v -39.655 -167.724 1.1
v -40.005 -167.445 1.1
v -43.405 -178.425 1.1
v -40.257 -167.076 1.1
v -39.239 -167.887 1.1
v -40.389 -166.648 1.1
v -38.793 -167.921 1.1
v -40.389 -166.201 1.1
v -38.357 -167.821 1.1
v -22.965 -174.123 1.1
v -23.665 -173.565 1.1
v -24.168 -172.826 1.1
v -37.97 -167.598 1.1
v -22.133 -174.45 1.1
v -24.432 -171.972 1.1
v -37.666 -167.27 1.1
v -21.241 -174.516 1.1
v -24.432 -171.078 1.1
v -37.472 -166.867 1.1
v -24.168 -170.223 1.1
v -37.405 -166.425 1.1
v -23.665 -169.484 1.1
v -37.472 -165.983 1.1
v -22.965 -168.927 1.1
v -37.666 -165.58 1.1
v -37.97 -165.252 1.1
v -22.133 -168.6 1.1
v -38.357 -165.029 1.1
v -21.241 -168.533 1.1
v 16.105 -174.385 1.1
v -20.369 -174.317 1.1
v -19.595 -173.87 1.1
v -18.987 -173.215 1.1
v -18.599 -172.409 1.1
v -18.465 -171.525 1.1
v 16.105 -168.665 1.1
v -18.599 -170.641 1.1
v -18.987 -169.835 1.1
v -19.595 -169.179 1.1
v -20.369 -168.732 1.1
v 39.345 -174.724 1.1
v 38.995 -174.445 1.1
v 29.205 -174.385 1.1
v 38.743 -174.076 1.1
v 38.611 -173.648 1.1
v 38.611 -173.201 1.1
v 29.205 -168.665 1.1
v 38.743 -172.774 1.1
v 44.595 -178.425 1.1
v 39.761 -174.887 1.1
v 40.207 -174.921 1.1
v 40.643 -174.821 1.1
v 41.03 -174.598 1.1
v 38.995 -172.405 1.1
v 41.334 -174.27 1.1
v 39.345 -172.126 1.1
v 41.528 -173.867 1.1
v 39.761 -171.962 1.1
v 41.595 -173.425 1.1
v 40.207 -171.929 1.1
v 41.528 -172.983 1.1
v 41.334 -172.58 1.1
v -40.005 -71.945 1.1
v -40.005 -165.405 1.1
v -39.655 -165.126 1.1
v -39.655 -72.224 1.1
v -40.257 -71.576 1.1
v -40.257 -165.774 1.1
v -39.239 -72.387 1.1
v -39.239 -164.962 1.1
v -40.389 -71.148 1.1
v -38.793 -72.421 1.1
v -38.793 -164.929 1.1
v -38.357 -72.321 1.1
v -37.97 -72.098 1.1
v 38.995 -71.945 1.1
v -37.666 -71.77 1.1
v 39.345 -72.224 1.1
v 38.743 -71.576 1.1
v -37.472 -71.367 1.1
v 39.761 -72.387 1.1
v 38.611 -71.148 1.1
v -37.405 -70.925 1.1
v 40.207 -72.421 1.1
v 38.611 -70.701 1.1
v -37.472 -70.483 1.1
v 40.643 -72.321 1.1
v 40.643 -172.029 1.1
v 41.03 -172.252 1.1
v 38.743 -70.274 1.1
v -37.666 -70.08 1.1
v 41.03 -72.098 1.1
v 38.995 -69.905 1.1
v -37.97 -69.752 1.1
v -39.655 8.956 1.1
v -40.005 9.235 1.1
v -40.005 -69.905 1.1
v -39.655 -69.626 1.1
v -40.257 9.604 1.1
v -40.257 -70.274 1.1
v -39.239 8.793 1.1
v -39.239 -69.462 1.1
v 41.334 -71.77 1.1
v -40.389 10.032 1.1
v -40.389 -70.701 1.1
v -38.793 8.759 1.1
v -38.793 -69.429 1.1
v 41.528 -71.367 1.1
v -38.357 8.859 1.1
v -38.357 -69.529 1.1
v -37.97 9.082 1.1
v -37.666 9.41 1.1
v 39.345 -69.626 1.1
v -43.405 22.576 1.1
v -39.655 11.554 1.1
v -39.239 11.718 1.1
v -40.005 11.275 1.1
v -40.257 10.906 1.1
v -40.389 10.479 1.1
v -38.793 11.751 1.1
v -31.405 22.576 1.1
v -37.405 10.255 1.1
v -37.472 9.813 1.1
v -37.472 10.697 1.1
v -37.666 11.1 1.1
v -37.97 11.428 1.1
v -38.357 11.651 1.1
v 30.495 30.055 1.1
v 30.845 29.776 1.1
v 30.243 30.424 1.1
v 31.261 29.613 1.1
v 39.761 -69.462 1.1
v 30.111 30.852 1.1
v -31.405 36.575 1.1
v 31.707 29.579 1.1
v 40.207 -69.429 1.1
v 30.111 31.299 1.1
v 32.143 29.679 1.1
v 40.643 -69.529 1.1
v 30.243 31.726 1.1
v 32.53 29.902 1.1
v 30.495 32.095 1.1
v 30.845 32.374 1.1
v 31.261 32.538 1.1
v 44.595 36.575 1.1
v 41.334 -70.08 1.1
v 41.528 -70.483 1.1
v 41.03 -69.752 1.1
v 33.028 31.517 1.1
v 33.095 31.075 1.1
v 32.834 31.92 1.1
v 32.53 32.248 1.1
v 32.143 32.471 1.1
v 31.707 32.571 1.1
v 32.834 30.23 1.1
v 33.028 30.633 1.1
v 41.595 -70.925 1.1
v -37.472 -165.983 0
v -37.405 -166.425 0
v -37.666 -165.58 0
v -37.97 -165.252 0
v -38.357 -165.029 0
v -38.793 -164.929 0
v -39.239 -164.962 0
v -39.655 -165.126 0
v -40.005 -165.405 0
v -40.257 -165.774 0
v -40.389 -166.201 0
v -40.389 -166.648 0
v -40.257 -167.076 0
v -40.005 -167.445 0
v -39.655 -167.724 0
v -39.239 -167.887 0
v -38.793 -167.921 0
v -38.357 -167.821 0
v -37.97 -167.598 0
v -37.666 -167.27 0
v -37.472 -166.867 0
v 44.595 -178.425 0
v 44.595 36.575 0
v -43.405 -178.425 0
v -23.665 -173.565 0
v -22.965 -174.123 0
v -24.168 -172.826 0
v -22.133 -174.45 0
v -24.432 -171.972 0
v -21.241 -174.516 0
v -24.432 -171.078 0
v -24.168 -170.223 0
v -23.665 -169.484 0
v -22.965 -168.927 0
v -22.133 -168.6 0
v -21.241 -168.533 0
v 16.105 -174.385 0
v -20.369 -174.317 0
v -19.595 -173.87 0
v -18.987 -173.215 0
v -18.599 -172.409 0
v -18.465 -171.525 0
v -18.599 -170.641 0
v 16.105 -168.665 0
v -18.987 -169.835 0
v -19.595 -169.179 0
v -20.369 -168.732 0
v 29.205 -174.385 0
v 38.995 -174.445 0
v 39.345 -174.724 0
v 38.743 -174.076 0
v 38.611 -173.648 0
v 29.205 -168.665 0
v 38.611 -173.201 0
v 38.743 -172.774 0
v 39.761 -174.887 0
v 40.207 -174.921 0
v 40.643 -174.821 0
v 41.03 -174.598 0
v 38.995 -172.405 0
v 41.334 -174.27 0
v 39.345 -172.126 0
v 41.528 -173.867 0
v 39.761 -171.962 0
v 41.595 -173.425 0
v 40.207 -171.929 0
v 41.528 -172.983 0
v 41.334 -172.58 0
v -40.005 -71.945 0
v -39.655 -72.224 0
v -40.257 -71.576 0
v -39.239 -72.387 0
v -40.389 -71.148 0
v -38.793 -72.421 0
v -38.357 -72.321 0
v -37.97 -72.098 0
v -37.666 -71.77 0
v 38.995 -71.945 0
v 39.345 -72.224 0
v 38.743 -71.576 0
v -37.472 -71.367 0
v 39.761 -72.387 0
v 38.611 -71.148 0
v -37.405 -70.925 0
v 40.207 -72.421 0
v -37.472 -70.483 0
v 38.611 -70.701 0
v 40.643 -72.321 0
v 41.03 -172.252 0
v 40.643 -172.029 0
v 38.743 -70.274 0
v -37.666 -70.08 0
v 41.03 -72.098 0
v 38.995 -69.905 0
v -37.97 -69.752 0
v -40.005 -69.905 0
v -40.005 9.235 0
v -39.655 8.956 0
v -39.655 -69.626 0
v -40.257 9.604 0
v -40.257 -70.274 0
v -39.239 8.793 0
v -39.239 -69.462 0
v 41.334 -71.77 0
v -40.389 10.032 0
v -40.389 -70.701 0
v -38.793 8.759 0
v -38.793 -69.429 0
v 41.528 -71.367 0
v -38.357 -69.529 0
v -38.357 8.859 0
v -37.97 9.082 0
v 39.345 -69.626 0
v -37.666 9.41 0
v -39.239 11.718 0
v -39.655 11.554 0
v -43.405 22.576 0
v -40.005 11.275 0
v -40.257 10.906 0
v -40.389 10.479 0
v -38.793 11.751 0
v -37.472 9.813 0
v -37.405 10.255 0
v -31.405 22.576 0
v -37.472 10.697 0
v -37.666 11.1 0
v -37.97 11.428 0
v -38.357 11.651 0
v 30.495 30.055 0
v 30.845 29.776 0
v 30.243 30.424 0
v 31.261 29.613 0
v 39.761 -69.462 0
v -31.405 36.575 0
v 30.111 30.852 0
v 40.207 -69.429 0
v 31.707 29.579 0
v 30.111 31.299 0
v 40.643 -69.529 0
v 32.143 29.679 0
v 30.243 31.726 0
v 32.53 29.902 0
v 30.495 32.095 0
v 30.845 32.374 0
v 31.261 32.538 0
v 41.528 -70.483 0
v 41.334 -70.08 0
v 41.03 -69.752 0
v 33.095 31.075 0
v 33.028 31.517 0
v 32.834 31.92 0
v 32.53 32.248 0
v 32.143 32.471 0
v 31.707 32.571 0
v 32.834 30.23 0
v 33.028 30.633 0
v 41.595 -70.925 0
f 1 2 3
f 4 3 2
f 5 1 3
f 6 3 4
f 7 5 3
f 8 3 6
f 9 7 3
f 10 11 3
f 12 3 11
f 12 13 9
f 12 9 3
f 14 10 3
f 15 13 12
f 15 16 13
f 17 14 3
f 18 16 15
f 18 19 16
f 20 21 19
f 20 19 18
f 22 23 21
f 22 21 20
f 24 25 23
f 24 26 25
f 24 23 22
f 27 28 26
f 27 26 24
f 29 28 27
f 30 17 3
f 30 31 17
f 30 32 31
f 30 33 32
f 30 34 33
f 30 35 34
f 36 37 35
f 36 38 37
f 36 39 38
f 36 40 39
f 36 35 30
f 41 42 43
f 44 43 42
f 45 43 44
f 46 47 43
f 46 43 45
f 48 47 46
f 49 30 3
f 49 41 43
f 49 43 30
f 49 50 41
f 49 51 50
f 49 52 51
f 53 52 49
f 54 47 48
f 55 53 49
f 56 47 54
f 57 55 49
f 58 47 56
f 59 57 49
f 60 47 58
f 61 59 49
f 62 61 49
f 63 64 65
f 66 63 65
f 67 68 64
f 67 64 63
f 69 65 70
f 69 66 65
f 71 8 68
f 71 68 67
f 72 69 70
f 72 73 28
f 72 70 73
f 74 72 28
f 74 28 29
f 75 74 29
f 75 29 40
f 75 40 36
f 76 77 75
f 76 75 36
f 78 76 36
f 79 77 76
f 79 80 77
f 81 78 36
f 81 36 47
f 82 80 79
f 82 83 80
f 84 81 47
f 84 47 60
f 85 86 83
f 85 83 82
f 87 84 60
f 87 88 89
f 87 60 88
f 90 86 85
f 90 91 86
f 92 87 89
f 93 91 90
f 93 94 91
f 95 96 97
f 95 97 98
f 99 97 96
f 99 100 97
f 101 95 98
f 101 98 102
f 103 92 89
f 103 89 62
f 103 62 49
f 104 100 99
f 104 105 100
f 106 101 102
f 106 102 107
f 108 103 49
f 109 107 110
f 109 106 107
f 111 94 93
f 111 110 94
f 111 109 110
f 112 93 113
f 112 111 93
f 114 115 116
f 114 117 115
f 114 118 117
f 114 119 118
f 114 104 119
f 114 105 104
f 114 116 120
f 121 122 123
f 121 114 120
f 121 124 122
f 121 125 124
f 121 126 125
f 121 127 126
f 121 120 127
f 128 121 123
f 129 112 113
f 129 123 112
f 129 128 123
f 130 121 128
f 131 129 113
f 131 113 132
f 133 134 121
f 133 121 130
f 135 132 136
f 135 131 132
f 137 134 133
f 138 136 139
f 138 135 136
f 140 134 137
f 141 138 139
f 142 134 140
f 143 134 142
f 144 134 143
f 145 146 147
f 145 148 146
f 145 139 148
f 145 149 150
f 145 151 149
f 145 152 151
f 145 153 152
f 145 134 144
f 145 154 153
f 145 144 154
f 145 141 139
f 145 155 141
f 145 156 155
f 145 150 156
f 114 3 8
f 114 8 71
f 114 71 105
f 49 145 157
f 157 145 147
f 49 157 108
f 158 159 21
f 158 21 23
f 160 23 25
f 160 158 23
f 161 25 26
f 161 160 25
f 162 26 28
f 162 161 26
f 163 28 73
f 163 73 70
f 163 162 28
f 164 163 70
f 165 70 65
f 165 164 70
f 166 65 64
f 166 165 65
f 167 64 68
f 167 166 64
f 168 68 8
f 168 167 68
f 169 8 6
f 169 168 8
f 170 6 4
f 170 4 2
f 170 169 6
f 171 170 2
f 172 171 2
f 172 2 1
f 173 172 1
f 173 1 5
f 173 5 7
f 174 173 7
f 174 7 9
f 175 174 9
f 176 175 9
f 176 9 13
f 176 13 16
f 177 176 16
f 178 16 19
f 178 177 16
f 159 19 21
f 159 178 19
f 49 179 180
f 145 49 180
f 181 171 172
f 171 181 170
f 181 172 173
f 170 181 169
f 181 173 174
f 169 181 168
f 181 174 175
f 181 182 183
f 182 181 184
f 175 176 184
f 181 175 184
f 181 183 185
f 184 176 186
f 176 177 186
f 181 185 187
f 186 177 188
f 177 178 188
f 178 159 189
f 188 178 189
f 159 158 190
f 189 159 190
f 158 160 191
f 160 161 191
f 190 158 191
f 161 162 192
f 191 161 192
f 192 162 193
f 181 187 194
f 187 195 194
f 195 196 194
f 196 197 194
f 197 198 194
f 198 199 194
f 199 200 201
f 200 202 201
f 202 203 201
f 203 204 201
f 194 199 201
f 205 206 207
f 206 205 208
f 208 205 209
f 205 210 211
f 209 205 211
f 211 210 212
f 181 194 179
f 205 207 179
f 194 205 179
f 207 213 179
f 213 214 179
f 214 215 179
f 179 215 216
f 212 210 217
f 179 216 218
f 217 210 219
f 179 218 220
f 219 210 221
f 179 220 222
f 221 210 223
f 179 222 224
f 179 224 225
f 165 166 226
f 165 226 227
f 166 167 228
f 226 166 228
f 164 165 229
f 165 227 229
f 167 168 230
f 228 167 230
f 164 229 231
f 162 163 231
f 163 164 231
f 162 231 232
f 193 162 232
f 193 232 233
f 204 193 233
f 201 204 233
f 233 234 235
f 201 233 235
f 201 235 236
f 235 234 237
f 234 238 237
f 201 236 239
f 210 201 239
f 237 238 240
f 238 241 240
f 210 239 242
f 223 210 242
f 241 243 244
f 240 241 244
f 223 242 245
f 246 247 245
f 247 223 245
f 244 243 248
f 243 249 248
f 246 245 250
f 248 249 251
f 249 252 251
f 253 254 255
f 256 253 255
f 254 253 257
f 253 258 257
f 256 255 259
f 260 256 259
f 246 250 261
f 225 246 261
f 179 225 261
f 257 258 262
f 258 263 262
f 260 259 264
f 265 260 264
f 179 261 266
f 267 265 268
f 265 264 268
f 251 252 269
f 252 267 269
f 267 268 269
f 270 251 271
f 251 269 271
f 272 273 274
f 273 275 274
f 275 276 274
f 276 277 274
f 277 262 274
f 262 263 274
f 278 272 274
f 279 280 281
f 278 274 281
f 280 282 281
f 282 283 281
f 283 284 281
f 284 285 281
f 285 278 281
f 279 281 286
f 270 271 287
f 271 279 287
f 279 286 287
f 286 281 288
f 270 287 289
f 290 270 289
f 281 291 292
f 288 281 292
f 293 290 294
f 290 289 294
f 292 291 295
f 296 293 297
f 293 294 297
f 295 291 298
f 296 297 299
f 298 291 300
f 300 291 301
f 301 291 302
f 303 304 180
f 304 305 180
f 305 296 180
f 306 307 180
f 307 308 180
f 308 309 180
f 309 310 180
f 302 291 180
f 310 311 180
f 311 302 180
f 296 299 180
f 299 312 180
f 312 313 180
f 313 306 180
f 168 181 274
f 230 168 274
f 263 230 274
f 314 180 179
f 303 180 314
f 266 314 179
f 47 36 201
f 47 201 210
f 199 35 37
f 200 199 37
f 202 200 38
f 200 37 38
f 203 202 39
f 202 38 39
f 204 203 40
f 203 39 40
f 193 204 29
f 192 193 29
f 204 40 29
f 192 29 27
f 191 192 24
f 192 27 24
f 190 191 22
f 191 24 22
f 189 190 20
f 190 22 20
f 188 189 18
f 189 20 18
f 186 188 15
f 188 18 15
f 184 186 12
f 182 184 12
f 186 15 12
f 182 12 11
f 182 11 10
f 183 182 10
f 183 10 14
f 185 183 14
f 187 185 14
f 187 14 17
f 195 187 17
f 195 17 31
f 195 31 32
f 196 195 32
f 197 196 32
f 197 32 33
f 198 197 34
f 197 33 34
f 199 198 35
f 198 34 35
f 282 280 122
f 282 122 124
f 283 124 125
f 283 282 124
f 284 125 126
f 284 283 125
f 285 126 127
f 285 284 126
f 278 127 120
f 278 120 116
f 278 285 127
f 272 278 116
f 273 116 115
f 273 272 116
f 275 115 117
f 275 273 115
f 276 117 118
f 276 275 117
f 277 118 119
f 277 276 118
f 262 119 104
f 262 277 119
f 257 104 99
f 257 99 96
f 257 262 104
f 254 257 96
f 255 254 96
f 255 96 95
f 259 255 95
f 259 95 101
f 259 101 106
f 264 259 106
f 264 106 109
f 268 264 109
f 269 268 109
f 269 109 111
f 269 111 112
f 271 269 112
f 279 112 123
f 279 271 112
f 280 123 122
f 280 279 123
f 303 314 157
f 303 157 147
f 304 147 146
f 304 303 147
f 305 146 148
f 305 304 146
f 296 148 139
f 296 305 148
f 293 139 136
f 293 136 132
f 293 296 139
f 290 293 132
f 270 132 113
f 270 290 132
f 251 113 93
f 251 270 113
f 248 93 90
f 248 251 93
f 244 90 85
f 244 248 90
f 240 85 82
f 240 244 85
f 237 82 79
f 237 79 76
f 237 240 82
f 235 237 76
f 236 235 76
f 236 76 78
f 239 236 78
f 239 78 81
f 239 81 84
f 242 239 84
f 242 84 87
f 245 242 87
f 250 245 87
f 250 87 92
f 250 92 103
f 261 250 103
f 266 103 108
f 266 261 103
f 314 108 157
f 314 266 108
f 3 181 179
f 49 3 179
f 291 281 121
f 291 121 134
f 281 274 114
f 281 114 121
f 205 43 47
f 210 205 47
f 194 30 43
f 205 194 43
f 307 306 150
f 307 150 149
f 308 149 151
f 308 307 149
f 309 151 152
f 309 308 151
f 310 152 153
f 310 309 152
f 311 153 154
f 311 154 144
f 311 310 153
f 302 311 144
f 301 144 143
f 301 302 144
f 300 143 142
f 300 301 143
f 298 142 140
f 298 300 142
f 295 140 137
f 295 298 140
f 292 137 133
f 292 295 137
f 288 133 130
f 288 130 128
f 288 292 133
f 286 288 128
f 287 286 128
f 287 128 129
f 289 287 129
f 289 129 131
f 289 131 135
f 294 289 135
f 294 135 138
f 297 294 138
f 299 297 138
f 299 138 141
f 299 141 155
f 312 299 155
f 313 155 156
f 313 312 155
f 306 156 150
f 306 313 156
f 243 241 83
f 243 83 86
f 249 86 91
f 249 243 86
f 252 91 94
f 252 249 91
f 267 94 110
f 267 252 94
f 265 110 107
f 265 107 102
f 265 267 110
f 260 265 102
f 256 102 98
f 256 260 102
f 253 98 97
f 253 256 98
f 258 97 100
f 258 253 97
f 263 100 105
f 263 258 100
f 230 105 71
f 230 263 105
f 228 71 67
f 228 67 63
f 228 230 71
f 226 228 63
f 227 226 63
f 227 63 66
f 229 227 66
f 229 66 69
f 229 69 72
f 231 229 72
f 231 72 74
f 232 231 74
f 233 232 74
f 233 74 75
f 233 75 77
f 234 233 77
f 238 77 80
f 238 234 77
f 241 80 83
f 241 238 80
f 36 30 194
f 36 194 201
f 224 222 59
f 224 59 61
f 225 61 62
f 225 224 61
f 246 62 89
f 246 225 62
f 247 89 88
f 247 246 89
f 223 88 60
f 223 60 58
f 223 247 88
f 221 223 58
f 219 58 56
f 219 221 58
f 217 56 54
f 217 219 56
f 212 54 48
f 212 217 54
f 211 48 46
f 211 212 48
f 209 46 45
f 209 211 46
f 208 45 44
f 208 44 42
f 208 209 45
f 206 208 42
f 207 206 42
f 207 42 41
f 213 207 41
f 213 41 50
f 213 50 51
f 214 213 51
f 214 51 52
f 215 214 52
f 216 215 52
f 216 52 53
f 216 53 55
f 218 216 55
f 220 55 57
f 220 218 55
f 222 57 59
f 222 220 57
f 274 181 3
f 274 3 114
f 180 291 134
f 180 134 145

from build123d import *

# Parameters (mm, degrees)
SKETCH3_W              = 88
SKETCH3_H              = 215
BOSS_EXTRUDE3_DEPTH    = 1.1
CUT_EXTRUDE1_OUTLINE_W = 12
CUT_EXTRUDE1_OUTLINE_H = 13.99905087
CUT_EXTRUDE1_OUTLINE_R = 1.5
CUT_EXTRUDE1_DEPTH     = 1.1
SKETCH4_R              = 3
CUT_EXTRUDE2_DEPTH     = 1.1
SKETCH5_W              = 13.1
SKETCH5_H              = 5.72
CUT_EXTRUDE3_DEPTH     = 1.1


# Read off the part's stored shape, not the designer's step: Cut-Extrude1
with BuildPart() as part:
    # Sketch3 → Boss-Extrude3 (new body)
    with BuildSketch(Plane.XY):
        with Locations((0.594511969, -70.924817192)):
            Rectangle(SKETCH3_W, SKETCH3_H)
    extrude(amount=BOSS_EXTRUDE3_DEPTH)

    # Cut-Extrude1 outline → Cut-Extrude1 (cut)
    with BuildSketch(Plane.XY):
        with Locations((-37.405488031, 29.575657373)):
            Rectangle(CUT_EXTRUDE1_OUTLINE_W, CUT_EXTRUDE1_OUTLINE_H)
        with Locations((31.594511969, 31.075182808)):
            Circle(CUT_EXTRUDE1_OUTLINE_R)
        with Locations((-38.905488031, -166.424817192)):
            Circle(CUT_EXTRUDE1_OUTLINE_R)
        with Locations((-38.905488031, -70.924817192)):
            Circle(CUT_EXTRUDE1_OUTLINE_R)
        with Locations((-38.905488031, 10.255182808)):
            Circle(CUT_EXTRUDE1_OUTLINE_R)
        with Locations((40.094511969, -70.924817192)):
            Circle(CUT_EXTRUDE1_OUTLINE_R)
        with Locations((40.094511969, -173.424817192)):
            Circle(CUT_EXTRUDE1_OUTLINE_R)
    extrude(amount=CUT_EXTRUDE1_DEPTH, mode=Mode.SUBTRACT)

    # Sketch4 → Cut-Extrude2 (cut)
    with BuildSketch(Plane.XY.offset(1.1)):
        with Locations((-21.465488031, -171.524817192)):
            Circle(SKETCH4_R)
    extrude(amount=-CUT_EXTRUDE2_DEPTH, mode=Mode.SUBTRACT)

    # Sketch5 → Cut-Extrude3 (cut)
    with BuildSketch(Plane.XY.offset(1.1)):
        with Locations((22.654511969, -171.524817192)):
            Rectangle(SKETCH5_W, SKETCH5_H)
    extrude(amount=-CUT_EXTRUDE3_DEPTH, mode=Mode.SUBTRACT)


solid = part.part
